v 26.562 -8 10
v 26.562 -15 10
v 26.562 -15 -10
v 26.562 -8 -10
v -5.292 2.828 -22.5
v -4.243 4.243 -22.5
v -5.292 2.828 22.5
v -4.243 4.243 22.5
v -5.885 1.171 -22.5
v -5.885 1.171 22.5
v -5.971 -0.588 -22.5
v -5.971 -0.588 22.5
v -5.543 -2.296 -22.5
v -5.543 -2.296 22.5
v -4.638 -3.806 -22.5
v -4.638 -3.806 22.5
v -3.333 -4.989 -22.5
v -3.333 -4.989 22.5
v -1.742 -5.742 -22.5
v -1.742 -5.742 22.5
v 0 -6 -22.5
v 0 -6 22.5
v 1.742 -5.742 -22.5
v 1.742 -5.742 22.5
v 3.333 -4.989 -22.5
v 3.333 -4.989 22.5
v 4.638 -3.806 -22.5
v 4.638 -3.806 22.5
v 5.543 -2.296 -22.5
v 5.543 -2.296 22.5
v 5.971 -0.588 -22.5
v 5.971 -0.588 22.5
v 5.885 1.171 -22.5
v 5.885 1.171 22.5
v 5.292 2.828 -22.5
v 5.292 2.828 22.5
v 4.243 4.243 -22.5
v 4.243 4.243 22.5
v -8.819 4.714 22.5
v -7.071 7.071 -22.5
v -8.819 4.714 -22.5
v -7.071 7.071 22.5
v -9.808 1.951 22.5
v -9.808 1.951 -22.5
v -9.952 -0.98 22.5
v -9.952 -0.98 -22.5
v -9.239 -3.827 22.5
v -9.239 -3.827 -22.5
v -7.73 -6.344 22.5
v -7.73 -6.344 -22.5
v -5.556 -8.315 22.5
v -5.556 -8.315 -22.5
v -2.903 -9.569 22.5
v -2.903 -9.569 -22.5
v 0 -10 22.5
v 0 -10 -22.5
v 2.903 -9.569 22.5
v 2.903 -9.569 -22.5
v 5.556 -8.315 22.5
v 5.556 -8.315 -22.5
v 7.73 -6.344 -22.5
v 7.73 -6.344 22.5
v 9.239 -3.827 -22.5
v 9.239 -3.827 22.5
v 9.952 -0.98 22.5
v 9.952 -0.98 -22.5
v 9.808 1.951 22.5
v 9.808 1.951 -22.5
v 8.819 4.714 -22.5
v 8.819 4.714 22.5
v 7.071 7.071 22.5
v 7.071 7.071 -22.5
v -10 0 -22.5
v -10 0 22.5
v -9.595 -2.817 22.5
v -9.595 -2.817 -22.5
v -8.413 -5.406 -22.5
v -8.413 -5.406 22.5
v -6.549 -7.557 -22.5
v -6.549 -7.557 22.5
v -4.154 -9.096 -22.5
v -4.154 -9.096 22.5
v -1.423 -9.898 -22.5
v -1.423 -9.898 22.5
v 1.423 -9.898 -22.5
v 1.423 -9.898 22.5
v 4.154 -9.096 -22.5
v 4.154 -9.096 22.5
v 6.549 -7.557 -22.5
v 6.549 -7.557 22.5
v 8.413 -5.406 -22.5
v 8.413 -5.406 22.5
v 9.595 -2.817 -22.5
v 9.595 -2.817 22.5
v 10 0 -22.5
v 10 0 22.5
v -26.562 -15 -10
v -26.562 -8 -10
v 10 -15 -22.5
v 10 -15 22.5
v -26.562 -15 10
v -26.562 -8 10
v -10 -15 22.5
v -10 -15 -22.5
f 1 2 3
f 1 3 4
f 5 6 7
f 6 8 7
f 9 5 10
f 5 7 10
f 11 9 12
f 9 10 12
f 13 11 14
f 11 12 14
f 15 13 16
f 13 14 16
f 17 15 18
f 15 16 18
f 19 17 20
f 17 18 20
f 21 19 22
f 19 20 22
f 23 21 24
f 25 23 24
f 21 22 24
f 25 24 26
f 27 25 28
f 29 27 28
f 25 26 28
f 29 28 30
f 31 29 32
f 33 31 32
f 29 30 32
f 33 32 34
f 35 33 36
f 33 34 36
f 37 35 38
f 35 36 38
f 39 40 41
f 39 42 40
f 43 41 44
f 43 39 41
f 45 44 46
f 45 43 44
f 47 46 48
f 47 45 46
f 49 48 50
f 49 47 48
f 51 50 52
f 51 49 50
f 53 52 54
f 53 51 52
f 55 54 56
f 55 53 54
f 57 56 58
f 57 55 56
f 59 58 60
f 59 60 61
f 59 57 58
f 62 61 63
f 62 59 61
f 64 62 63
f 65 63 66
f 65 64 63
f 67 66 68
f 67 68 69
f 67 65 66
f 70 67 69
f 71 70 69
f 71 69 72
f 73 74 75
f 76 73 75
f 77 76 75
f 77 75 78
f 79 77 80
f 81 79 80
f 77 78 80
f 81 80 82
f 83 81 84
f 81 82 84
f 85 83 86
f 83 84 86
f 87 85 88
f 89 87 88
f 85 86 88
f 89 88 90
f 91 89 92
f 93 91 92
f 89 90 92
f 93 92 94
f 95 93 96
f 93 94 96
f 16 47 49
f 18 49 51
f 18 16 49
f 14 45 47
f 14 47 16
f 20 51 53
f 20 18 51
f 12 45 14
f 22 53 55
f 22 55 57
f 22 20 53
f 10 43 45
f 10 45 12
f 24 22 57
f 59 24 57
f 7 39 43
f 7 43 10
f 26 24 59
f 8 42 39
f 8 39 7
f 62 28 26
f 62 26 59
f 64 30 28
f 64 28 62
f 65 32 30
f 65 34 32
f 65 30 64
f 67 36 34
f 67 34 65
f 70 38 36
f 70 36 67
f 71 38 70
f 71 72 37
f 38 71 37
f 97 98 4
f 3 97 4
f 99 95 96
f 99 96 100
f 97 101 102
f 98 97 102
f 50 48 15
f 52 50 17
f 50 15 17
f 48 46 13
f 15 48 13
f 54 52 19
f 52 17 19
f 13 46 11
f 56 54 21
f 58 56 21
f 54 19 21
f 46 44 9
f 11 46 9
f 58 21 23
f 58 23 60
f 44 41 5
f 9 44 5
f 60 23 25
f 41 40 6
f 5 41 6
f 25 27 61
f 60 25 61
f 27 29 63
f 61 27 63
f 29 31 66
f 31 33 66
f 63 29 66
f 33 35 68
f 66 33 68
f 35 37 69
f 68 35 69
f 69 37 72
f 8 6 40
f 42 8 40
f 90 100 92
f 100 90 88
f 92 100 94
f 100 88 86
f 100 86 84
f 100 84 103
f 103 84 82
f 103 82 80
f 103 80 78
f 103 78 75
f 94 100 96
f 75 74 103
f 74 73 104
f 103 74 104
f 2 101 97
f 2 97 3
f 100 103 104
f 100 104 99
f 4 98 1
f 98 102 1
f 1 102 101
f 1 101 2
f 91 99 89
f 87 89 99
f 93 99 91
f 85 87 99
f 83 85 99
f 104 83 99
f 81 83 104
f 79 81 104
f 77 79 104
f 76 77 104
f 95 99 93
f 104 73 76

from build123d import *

# Parameters (mm, degrees)
PAD_DEPTH    = 22.5
PAD001_DEPTH = 22.5
SKETCH004_W  = 53.124624
SKETCH004_H  = 7
PAD002_DEPTH = 10


with BuildPart() as pad:
    # Sketch → Pad (new body, symmetric)
    with BuildSketch(Plane.XY):
        with BuildLine():
            ThreePointArc((-7.071068, 7.071068), (0, -10), (7.071068, 7.071068))
            Line((7.071068, 7.071068), (4.242641, 4.242641))
            ThreePointArc((-4.242641, 4.242641), (0, -6), (4.242641, 4.242641))
            Line((-4.242641, 4.242641), (-7.071068, 7.071068))
        make_face()
    extrude(amount=PAD_DEPTH, both=True)


with BuildPart() as pad001:
    # Sketch003 → Pad001 (new body, symmetric)
    with BuildSketch(Plane.XY):
        with BuildLine():
            ThreePointArc((-10, 0), (0, -10), (10, 0))
            Line((10, 0), (10, -15))
            Line((-10, -15), (10, -15))
            Line((-10, 0), (-10, -15))
        make_face()
    extrude(amount=PAD001_DEPTH, both=True)


with BuildPart() as pad002:
    # Sketch004 → Pad002 (new body, symmetric)
    with BuildSketch(Plane.XY):
        with Locations((0, -11.5)):
            Rectangle(SKETCH004_W, SKETCH004_H)
    extrude(amount=PAD002_DEPTH, both=True)


solid = Compound([pad.part, pad001.part, pad002.part])
